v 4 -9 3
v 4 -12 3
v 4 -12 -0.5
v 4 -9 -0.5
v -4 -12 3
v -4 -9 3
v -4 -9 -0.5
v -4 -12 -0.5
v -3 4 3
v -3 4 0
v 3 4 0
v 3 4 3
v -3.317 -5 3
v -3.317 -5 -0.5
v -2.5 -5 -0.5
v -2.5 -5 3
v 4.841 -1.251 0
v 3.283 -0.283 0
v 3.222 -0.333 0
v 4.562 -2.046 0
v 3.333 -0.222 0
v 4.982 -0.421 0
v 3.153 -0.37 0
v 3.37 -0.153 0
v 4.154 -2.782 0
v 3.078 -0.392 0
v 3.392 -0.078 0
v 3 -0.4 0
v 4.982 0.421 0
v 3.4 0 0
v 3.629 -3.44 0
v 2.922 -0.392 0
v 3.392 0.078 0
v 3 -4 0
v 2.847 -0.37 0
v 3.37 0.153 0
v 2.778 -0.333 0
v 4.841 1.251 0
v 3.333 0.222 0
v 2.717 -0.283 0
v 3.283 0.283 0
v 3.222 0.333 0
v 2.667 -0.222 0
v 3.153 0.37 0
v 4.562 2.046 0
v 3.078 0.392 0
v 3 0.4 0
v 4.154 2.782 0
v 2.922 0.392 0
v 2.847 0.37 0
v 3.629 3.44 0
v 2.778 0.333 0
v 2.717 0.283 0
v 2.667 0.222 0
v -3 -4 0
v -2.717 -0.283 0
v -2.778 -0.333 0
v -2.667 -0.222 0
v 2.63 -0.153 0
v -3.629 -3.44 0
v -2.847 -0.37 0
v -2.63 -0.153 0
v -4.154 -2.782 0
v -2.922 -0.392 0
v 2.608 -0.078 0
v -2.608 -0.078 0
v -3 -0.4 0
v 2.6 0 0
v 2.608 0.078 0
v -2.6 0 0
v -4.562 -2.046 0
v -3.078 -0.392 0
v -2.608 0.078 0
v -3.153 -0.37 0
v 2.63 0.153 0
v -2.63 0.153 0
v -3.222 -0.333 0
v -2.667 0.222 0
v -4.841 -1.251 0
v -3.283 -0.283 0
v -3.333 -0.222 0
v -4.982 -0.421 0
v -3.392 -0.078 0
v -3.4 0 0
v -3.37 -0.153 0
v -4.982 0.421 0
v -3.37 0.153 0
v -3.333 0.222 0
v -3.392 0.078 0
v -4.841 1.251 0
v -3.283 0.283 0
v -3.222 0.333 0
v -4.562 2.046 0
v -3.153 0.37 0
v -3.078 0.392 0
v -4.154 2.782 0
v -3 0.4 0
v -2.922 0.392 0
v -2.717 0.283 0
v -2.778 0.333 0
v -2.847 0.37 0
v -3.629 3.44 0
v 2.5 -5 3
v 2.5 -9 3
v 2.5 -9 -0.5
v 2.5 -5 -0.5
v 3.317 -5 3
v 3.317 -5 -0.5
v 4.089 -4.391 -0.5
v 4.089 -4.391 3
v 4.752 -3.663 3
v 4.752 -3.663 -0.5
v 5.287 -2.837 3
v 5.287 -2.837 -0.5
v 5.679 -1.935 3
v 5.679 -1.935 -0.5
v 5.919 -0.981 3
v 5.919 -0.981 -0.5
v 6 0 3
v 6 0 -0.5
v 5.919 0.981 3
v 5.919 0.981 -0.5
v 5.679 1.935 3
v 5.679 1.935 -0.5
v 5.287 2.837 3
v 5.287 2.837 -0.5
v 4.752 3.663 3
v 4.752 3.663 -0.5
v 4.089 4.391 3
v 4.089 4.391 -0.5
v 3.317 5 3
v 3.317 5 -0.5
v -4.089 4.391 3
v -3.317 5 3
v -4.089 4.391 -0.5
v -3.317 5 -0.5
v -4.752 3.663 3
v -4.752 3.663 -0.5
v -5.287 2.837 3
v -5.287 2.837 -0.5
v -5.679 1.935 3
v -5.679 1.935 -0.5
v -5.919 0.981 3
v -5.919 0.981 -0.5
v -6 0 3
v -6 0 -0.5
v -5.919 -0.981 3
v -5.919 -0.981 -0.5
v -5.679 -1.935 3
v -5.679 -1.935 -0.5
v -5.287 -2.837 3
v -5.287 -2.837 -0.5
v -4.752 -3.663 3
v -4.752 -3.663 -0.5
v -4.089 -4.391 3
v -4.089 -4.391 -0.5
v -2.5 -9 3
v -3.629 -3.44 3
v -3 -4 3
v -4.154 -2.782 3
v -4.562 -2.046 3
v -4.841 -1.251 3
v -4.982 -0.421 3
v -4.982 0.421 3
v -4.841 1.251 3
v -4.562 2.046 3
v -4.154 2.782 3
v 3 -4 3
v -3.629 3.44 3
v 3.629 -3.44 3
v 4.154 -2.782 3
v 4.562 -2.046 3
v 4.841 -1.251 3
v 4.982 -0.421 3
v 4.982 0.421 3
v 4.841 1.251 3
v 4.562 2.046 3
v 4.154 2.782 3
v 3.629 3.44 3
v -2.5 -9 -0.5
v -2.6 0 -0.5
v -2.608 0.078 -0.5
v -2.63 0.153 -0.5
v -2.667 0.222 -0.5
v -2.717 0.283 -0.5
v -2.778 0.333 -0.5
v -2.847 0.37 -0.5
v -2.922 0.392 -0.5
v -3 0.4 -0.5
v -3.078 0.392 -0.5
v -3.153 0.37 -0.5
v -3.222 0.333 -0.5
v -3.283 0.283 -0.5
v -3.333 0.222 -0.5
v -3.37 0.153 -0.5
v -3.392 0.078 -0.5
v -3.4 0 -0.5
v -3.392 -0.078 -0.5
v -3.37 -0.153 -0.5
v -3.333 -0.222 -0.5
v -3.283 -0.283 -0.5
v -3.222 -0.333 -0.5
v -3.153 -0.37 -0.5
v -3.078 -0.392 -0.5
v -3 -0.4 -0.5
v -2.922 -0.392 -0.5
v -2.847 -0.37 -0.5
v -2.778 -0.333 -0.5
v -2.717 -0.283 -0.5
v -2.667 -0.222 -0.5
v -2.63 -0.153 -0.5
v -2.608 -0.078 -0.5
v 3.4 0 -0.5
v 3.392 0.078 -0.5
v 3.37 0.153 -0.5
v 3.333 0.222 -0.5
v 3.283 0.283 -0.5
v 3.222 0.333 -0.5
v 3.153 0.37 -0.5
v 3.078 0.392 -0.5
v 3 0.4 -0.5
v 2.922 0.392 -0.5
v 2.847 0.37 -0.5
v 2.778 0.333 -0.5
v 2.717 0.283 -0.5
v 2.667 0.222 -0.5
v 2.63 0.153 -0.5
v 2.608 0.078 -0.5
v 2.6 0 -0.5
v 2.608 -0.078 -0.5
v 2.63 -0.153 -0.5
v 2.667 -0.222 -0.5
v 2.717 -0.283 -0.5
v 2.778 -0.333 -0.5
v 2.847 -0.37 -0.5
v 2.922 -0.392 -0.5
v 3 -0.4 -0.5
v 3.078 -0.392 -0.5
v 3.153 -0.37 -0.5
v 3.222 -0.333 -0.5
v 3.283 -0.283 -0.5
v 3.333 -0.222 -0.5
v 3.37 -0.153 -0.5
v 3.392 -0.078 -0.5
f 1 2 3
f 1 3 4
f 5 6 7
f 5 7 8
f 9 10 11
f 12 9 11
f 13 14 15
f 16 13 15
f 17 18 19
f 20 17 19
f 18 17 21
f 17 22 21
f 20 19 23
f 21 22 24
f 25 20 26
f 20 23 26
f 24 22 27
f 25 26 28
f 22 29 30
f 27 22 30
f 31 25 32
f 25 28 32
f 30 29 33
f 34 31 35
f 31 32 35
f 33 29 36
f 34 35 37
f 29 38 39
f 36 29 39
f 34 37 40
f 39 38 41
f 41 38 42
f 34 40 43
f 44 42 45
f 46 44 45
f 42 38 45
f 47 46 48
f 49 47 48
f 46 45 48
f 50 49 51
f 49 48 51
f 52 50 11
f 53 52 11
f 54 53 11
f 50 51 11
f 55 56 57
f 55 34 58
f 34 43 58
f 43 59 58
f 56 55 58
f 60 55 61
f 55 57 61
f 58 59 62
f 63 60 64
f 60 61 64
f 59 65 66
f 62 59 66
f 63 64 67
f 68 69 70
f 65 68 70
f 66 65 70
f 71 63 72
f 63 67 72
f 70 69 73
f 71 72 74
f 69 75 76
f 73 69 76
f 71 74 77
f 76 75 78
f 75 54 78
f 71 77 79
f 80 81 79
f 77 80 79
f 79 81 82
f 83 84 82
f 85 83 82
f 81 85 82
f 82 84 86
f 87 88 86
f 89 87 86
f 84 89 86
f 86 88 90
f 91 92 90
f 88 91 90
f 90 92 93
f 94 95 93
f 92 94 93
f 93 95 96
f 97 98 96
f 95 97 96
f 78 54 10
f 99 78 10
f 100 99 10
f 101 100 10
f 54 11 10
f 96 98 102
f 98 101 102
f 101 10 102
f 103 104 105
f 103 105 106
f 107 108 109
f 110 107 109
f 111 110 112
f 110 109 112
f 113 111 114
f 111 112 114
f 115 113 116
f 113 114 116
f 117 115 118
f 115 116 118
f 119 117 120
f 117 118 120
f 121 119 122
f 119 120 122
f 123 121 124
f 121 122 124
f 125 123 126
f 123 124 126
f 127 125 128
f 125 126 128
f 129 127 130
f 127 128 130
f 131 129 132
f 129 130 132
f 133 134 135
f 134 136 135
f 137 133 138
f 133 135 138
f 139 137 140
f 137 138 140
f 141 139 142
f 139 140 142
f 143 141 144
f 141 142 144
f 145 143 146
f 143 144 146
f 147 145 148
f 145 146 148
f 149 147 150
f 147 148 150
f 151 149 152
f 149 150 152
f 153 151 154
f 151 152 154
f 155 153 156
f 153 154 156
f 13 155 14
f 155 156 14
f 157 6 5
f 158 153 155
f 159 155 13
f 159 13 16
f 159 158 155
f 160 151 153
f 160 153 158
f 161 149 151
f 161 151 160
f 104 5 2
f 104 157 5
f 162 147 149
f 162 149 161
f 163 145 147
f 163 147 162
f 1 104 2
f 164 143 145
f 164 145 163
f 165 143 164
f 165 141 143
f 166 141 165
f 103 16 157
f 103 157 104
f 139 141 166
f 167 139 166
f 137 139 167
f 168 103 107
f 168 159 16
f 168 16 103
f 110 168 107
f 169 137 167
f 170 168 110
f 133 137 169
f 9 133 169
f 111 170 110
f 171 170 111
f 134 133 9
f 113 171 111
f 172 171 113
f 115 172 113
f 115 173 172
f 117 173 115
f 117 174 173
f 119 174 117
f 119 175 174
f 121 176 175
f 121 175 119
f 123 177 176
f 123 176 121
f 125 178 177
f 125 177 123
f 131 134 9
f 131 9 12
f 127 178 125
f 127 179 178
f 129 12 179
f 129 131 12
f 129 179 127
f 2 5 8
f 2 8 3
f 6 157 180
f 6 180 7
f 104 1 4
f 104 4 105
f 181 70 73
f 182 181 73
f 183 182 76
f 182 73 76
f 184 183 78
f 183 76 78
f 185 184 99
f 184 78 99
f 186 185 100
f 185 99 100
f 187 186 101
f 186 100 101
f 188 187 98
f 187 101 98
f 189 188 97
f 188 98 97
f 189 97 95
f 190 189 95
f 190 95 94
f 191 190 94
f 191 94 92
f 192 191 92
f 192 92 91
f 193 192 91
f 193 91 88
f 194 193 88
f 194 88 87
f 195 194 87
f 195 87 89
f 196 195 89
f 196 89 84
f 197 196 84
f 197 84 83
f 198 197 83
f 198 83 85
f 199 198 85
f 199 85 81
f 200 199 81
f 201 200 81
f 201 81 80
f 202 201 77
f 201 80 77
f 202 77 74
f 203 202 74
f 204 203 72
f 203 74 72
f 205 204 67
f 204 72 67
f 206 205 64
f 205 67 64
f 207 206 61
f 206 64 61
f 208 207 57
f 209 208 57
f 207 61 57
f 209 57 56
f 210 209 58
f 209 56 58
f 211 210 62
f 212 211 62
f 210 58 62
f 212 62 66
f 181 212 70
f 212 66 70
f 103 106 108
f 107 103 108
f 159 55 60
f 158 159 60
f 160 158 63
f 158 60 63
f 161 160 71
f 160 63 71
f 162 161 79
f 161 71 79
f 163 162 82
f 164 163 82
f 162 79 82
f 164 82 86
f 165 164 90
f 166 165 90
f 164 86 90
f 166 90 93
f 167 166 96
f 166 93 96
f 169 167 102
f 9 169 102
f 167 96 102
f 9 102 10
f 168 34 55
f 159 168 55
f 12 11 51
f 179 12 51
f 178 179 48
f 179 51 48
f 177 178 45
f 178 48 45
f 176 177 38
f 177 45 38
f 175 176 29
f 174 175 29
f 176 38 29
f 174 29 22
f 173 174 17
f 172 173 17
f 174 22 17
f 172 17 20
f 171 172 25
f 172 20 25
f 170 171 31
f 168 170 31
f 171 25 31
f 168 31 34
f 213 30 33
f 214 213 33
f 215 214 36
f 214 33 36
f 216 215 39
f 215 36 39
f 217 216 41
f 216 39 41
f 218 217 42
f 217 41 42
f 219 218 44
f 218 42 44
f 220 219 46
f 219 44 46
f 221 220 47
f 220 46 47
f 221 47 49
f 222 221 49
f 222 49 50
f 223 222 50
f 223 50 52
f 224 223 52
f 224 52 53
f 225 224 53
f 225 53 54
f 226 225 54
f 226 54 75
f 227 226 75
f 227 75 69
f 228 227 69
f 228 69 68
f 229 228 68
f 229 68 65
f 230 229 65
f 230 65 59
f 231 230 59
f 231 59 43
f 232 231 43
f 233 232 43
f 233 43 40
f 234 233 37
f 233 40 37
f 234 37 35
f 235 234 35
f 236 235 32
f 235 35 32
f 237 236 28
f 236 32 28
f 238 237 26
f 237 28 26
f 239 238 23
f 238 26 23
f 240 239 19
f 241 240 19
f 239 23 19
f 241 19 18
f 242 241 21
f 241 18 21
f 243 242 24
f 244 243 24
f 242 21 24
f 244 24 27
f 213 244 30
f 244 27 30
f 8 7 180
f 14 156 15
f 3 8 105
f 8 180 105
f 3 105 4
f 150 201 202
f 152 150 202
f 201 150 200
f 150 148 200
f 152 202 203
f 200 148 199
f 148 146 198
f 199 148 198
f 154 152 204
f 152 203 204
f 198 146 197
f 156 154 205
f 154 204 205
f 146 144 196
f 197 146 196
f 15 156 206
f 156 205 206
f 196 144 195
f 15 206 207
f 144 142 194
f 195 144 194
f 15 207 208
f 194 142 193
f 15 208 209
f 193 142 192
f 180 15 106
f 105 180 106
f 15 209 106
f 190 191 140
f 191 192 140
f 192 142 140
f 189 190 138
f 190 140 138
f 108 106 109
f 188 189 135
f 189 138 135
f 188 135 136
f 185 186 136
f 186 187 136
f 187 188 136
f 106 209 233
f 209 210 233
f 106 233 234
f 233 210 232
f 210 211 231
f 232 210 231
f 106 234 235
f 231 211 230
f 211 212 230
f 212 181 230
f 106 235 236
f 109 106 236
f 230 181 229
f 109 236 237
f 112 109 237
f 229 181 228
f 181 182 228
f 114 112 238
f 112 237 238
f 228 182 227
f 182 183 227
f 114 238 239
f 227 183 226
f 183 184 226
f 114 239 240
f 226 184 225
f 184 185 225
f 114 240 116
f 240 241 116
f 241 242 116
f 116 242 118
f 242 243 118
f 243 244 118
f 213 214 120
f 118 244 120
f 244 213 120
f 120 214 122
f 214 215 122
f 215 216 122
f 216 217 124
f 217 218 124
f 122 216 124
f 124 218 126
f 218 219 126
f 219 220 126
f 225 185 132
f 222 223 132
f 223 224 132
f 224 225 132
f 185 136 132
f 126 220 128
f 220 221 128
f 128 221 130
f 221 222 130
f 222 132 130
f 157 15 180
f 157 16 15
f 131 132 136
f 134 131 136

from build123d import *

# Parameters (mm, degrees)
BOSS_EXTRU_1_DEPTH      = 0.5
BOSS_EXTRU_2_START      = 3
BOSS_EXTRU_2_DEPTH      = 3
ESQUISSE1_4_R           = 0.4
ENL_V_MAT_EXTRU_1_DEPTH = 9.366600265
BOSS_EXTRU_3_DEPTH      = 3
BOSS_EXTRU_3_DEPTH_BACK = 0.5


with BuildPart() as part:
    # Esquisse1 → Boss.-Extru.1 (new body)
    with BuildSketch(Plane.XY):
        with BuildLine():
            Line((-3.31662479, 5), (3.31662479, 5))
            ThreePointArc((3.31662479, 5), (6, 0), (3.31662479, -5))
            Line((3.31662479, -5), (-3.31662479, -5))
            ThreePointArc((-3.31662479, -5), (-6, 0), (-3.31662479, 5))
        make_face()
    extrude(amount=-BOSS_EXTRU_1_DEPTH)

    # Esquisse1_3 → Boss.-Extru.2 (add)
    with BuildSketch(Plane.XY.offset(BOSS_EXTRU_2_START)):
        with BuildLine():
            Line((3.31662479, 5), (-3.31662479, 5))
            ThreePointArc((-3.31662479, 5), (-6, 0), (-3.31662479, -5))
            Line((-3.31662479, -5), (-2.5, -5))
            Line((-2.5, -5), (2.5, -5))
            Line((2.5, -5), (3.31662479, -5))
            ThreePointArc((3.31662479, -5), (6, 0), (3.31662479, 5))
        make_face()
        with BuildLine():
            ThreePointArc((-3, -4), (-5, 0), (-3, 4))
            Line((-3, 4), (3, 4))
            ThreePointArc((3, 4), (5, 0), (3, -4))
            Line((3, -4), (-3, -4))
        make_face(mode=Mode.SUBTRACT)
    extrude(amount=-BOSS_EXTRU_2_DEPTH)

    # Esquisse1_4 → Enl_v. mat.-Extru.1 (cut, through all)
    with BuildSketch(Plane.XY):
        with Locations((-3, 0)):
            Circle(ESQUISSE1_4_R)
        with Locations((3, 0)):
            Circle(ESQUISSE1_4_R)
    extrude(amount=-ENL_V_MAT_EXTRU_1_DEPTH, mode=Mode.SUBTRACT)

    # Esquisse1_5 → Boss.-Extru.3 (add, two sides: drawn at the far end of the back side and taken through both)
    with BuildSketch(Plane.XY.offset(-BOSS_EXTRU_3_DEPTH_BACK)):
        Polygon((2.5, -5), (-2.5, -5), (-2.5, -9), (-4, -9), (-4, -12), (4, -12), (4, -9), (2.5, -9), align=None)
    extrude(amount=BOSS_EXTRU_3_DEPTH + BOSS_EXTRU_3_DEPTH_BACK)


solid = part.part
